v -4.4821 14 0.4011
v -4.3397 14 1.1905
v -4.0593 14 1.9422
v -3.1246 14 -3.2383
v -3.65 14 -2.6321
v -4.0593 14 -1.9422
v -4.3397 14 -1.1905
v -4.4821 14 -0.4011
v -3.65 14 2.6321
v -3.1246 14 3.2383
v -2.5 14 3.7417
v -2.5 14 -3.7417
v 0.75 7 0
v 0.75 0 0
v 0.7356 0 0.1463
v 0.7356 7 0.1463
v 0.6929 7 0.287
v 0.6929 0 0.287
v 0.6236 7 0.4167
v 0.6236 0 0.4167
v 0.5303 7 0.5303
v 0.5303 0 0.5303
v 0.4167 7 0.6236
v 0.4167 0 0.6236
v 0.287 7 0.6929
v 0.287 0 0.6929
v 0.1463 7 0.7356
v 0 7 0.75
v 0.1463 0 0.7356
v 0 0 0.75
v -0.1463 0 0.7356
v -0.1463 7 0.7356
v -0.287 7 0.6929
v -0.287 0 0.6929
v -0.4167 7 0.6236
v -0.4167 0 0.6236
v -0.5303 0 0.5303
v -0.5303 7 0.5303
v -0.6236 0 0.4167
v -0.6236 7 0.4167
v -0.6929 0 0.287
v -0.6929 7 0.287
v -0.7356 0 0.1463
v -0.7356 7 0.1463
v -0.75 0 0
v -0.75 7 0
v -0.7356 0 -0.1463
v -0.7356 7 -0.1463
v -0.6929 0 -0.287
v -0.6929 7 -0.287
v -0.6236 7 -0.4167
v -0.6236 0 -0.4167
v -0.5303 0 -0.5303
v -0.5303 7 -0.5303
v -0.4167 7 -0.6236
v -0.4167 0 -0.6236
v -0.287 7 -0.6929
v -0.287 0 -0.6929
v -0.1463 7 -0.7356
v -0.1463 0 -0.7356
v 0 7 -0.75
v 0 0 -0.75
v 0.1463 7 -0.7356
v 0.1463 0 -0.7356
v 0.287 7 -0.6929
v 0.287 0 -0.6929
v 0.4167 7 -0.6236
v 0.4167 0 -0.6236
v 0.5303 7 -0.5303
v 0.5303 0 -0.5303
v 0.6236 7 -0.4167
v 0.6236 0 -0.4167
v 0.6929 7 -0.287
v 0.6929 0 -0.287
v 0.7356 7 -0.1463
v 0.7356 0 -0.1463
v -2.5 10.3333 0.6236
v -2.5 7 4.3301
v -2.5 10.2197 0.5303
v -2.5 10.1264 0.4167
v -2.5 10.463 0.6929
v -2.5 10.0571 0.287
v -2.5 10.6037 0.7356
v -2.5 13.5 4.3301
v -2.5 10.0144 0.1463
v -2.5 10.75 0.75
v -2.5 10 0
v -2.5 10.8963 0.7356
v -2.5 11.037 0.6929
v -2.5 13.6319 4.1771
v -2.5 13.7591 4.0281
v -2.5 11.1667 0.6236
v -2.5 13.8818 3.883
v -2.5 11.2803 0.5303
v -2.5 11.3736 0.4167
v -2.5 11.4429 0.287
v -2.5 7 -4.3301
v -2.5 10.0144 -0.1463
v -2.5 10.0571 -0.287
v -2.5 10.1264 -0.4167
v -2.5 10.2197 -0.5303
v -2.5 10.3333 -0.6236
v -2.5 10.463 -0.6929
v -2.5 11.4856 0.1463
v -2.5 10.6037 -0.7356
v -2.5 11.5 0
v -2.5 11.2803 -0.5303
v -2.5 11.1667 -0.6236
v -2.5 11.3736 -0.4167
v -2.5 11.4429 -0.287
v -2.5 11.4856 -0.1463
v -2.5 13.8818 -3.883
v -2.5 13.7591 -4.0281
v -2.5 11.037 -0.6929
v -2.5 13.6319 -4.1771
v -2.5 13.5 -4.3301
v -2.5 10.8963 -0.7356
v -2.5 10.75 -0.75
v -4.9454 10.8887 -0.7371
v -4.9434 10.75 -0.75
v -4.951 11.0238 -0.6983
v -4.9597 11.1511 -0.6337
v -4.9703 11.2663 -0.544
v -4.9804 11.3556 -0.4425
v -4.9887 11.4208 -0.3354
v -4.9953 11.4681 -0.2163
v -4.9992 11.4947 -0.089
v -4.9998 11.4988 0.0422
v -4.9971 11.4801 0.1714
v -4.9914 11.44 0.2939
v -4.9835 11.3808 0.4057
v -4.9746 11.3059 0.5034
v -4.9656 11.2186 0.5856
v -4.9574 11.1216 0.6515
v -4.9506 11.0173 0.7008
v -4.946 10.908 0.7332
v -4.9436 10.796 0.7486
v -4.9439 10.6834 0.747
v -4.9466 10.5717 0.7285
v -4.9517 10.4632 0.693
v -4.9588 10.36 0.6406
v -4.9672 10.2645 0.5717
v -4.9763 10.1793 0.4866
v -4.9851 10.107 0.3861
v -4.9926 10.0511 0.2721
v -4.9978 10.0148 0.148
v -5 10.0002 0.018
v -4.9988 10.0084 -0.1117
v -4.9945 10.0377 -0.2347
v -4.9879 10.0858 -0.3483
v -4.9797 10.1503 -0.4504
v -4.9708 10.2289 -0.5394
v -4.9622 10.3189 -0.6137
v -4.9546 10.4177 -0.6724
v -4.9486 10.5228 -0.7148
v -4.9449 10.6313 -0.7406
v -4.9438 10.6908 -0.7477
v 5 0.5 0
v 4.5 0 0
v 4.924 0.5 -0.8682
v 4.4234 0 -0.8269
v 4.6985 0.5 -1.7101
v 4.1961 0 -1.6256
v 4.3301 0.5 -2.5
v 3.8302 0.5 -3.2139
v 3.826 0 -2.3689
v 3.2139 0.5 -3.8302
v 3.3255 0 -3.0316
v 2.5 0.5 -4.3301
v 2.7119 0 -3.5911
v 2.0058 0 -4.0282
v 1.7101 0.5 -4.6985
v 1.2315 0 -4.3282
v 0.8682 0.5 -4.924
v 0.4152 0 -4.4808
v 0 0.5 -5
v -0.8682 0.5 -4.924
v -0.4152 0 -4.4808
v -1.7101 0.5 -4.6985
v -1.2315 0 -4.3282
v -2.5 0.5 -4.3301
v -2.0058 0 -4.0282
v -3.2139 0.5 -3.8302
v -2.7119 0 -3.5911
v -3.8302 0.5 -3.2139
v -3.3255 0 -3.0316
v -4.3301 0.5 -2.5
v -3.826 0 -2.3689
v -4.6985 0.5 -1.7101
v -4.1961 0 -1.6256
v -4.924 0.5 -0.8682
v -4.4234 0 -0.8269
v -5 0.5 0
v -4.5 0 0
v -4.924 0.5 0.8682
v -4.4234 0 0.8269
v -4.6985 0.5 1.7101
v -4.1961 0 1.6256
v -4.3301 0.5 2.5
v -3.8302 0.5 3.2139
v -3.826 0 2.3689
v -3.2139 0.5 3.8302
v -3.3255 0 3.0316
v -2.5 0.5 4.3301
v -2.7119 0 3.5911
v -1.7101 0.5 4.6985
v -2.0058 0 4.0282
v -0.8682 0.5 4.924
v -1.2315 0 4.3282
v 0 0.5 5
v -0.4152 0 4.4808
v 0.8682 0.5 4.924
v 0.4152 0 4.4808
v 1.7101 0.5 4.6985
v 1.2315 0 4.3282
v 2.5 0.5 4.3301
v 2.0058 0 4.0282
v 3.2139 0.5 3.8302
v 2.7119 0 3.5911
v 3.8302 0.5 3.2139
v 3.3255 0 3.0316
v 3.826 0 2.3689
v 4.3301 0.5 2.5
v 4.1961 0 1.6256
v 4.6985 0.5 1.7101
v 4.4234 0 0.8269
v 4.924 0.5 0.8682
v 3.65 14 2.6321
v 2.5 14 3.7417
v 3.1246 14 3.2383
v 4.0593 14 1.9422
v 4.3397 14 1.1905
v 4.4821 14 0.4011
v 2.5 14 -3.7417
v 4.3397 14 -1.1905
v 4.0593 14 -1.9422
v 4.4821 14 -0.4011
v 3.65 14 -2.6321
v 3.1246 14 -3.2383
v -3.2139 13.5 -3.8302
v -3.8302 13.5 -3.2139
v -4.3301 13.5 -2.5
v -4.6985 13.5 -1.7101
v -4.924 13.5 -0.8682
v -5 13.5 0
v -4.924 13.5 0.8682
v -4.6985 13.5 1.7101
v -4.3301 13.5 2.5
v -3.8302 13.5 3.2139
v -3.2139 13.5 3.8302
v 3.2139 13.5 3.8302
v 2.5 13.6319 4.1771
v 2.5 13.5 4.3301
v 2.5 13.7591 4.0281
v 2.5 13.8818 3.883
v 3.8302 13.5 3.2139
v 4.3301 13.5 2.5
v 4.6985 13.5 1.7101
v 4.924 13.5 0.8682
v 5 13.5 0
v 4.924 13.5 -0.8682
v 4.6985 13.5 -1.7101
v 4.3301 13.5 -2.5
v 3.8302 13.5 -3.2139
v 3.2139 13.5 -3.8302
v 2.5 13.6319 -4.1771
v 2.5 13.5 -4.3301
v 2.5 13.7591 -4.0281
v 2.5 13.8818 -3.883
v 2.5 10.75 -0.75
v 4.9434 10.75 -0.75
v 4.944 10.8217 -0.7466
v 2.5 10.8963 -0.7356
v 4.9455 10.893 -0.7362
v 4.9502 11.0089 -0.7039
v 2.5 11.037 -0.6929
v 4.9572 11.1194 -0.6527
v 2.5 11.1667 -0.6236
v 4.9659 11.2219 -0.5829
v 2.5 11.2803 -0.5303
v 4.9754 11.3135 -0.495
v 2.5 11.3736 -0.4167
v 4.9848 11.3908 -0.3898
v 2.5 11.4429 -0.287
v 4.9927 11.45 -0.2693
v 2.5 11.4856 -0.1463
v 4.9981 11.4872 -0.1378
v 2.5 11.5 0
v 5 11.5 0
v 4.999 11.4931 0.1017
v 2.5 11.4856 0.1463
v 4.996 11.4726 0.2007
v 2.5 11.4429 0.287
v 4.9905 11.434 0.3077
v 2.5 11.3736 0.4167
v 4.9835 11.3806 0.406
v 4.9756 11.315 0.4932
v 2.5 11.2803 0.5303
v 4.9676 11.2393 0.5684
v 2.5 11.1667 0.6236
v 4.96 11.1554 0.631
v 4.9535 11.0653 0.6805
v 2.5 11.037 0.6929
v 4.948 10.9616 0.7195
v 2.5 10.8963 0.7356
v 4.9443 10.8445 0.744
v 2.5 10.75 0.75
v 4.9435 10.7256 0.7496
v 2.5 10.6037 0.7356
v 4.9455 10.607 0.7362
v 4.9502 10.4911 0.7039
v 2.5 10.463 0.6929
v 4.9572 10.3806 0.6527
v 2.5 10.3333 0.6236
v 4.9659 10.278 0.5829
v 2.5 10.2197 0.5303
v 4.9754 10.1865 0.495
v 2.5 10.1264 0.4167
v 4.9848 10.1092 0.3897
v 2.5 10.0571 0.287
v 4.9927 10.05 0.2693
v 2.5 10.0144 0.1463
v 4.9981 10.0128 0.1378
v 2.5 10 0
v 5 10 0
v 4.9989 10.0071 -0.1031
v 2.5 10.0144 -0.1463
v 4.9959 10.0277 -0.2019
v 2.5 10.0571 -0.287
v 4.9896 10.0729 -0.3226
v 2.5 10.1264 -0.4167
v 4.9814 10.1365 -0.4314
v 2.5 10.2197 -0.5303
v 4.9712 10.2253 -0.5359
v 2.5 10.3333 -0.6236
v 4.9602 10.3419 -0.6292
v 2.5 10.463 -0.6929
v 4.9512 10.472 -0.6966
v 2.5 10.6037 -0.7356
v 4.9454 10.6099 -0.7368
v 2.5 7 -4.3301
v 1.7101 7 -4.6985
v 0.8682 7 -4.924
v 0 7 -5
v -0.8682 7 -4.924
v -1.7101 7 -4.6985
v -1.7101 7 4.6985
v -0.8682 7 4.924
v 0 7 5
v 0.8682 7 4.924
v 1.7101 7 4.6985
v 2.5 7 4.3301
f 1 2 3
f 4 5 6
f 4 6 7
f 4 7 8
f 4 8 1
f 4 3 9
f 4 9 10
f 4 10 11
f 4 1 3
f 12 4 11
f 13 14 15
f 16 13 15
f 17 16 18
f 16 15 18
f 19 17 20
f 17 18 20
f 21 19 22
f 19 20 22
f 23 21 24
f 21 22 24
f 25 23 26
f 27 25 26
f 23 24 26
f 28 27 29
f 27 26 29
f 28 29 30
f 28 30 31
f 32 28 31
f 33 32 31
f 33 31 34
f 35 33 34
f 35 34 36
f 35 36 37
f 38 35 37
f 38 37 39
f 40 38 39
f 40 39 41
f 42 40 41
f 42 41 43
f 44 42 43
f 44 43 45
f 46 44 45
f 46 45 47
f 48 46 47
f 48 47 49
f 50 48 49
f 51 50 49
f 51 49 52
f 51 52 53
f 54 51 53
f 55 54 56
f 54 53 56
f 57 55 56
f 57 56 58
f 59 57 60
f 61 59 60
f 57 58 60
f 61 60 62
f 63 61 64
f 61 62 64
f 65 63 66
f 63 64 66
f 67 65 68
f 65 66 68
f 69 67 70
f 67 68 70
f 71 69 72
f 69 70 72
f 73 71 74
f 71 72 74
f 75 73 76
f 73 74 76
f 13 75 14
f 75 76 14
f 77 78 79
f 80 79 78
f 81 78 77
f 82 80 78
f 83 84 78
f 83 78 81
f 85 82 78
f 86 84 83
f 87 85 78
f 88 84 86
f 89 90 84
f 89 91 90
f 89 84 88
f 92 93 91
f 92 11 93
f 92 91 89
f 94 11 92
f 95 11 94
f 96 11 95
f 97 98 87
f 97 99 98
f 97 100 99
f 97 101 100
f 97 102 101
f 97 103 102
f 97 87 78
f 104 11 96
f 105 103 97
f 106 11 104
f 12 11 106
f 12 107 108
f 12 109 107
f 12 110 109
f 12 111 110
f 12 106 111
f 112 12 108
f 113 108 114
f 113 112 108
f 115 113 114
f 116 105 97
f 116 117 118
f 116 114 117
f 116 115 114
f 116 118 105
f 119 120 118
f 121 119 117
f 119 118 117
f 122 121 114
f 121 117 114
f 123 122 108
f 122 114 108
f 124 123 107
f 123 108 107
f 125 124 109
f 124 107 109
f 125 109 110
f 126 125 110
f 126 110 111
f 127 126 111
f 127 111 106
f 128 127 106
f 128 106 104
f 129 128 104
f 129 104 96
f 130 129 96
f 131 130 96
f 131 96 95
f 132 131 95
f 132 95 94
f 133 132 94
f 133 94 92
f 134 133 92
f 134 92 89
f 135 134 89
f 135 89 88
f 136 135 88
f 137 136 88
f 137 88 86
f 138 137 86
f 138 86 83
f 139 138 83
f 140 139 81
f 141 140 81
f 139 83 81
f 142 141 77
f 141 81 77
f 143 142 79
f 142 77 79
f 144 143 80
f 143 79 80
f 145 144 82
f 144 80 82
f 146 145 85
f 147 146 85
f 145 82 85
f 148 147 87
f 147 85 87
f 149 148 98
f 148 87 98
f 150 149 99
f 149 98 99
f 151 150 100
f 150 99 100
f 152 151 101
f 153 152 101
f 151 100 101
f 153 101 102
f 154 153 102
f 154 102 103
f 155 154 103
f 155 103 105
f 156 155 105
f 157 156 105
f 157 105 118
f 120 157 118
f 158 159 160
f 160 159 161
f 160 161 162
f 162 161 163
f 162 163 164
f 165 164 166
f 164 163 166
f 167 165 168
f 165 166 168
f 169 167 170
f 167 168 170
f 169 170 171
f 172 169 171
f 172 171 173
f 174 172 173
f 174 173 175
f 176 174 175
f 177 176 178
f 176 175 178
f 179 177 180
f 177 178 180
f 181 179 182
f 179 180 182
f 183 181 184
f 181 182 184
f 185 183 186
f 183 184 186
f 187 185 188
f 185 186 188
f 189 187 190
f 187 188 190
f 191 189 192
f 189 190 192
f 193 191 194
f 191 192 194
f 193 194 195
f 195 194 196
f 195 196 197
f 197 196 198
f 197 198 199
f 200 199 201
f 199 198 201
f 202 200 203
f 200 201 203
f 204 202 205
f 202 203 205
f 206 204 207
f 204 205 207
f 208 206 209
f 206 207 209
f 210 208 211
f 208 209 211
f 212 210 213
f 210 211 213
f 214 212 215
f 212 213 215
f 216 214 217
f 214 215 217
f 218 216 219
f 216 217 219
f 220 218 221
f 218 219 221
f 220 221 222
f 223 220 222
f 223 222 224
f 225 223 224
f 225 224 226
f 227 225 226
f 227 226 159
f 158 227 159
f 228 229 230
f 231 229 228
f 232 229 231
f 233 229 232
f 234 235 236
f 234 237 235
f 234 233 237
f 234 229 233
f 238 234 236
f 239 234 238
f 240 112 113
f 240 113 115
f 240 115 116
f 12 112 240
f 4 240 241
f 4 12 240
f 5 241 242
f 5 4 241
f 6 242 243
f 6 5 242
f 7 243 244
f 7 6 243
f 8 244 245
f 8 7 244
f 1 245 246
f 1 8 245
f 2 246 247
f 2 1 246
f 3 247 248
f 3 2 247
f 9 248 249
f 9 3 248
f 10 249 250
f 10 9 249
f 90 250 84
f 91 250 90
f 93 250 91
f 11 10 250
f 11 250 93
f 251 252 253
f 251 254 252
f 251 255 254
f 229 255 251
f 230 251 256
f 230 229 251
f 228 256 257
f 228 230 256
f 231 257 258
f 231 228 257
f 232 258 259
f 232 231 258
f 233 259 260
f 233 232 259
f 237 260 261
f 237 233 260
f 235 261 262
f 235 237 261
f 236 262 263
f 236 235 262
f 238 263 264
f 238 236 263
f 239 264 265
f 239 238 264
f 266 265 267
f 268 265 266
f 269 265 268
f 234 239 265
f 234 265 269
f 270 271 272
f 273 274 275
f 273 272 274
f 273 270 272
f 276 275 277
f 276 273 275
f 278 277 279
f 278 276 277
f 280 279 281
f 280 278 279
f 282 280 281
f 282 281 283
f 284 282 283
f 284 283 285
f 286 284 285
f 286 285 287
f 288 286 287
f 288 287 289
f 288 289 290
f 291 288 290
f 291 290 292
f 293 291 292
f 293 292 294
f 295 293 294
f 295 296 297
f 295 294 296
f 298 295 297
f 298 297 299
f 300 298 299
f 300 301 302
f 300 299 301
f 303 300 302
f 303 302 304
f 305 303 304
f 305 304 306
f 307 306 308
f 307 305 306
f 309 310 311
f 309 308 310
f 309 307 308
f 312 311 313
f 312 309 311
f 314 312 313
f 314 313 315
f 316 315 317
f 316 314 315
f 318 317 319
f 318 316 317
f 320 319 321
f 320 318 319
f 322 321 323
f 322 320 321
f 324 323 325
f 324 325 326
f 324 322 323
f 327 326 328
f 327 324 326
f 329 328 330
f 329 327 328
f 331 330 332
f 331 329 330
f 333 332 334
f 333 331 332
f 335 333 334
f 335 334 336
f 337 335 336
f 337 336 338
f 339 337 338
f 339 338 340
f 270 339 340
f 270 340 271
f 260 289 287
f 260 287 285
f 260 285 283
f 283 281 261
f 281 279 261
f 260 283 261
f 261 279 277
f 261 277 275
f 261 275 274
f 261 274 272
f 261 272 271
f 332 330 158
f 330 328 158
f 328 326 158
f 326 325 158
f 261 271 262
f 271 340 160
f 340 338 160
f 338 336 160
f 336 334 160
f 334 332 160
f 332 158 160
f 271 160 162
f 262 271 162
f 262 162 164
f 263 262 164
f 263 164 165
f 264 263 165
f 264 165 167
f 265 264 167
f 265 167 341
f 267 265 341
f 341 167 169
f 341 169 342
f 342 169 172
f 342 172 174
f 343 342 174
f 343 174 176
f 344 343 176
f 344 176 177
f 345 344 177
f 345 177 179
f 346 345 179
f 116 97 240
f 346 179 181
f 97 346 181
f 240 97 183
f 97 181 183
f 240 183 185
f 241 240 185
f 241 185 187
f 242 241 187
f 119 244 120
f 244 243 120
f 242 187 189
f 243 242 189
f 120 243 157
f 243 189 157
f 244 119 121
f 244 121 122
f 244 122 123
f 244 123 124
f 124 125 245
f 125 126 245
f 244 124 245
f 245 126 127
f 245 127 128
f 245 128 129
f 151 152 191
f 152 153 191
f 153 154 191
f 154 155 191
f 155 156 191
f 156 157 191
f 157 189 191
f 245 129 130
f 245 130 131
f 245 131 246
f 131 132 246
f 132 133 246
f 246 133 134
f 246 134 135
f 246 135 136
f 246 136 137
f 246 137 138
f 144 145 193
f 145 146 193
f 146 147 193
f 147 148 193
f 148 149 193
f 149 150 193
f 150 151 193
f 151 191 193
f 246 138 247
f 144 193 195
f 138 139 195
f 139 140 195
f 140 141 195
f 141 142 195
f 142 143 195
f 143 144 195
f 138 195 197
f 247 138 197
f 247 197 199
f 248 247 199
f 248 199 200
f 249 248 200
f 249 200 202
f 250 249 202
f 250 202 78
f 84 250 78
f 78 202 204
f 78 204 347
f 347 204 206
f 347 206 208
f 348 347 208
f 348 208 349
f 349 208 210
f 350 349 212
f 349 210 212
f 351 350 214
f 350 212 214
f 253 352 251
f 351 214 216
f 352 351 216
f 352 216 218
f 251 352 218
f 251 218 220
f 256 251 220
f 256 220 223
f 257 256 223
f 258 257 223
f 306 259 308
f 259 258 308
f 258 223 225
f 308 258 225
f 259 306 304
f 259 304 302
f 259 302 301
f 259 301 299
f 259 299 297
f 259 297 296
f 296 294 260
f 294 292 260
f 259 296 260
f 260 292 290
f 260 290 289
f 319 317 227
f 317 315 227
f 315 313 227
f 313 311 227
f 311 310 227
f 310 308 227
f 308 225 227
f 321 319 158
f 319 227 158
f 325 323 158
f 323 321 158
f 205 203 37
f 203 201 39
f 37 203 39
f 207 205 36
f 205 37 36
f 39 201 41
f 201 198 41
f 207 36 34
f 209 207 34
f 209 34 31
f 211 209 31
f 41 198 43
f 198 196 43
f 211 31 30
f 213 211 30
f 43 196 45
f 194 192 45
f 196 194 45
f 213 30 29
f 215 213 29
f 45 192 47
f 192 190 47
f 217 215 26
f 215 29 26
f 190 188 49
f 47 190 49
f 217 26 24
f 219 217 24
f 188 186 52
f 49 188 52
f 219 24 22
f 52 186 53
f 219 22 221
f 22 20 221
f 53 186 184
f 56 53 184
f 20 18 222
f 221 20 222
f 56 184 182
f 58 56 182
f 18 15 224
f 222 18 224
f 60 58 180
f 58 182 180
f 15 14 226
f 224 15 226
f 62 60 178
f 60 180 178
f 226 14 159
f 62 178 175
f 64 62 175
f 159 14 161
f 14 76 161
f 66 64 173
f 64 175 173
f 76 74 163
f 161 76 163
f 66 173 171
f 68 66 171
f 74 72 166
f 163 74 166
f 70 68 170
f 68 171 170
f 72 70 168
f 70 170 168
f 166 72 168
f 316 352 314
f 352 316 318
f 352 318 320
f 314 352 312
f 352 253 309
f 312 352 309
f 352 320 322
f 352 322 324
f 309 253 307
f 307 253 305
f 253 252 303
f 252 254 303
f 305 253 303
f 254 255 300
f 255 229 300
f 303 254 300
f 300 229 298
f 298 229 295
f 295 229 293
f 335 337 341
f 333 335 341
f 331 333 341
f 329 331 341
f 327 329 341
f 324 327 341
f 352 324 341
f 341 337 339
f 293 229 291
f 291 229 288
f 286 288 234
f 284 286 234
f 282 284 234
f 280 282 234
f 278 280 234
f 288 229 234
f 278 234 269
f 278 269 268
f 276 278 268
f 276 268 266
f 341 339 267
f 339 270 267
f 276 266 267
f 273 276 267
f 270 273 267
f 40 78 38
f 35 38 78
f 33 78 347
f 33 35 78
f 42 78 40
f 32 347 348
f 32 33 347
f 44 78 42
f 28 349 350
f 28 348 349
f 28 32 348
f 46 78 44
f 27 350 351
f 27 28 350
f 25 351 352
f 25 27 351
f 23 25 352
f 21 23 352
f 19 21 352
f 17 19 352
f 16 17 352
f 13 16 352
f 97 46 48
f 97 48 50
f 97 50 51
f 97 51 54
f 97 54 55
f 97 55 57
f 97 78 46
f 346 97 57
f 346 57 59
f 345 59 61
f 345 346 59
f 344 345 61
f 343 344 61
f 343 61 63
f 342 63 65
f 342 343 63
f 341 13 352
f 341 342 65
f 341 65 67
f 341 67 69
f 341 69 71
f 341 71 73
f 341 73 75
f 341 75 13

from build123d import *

# Parameters (mm, degrees)
SKETCH1_R                      = 5
BOSS_EXTRUDE1_DEPTH            = 14
CHAMFER1_SIZE                  = 0.5
CUT_EXTRUDE1_REACH             = 16
SKETCH2_R                      = 0.75
SKETCH3_W                      = 5
SKETCH3_H                      = 10
CUT_EXTRUDE2_DEPTH             = 7
CUT_EXTRUDE3_REACH             = 7
SKETCH4_R                      = 0.75
CUT_EXTRUDE3_DIRECTION_2_REACH = 7


with BuildPart() as part:
    # Sketch1 → Boss-Extrude1 (new body)
    with BuildSketch(Plane(origin=(0, 0, 0), x_dir=(1, 0, 0), z_dir=(0, 1, 0))):
        Circle(SKETCH1_R)
    extrude(amount=BOSS_EXTRUDE1_DEPTH)

    # Chamfer1
    chamfer1_edges = [part.edges().sort_by_distance(p)[0] for p in [
        (-5, 0, 0),
        (-5, 14, 0),
    ]]
    chamfer(chamfer1_edges, length=CHAMFER1_SIZE)

    # Sketch2 → Cut-Extrude1 (cut, up to next)
    with BuildSketch(Plane.XZ, mode=Mode.PRIVATE) as cut_extrude1_sk1:
        Circle(SKETCH2_R)
    cut_extrude1_tool1 = extrude(cut_extrude1_sk1.sketch, amount=-CUT_EXTRUDE1_REACH, mode=Mode.PRIVATE) & part.part
    add(cut_extrude1_tool1.solids().sort_by_distance((0, 0, 0))[0], mode=Mode.SUBTRACT)

    # Sketch3 → Cut-Extrude2 (cut)
    with BuildSketch(Plane(origin=(0, 14, 0), x_dir=(1, 0, 0), z_dir=(0, 1, 0))):
        Rectangle(SKETCH3_W, SKETCH3_H)
    extrude(amount=-CUT_EXTRUDE2_DEPTH, mode=Mode.SUBTRACT)

    # Sketch4 → Cut-Extrude3 (cut, up to next)
    with BuildSketch(Plane(origin=(0, 0, 0), x_dir=(0, 0, -1), z_dir=(1, 0, 0)), mode=Mode.PRIVATE) as cut_extrude3_sk1:
        with Locations((0, 10.75)):
            Circle(SKETCH4_R)
    cut_extrude3_tool1 = extrude(cut_extrude3_sk1.sketch, amount=-CUT_EXTRUDE3_REACH, mode=Mode.PRIVATE) & part.part
    add(cut_extrude3_tool1.solids().sort_by_distance((0, 10.75, 0))[0], mode=Mode.SUBTRACT)

    # Sketch4 → Cut-Extrude3 direction 2 (cut, up to next)
    with BuildSketch(Plane(origin=(0, 0, 0), x_dir=(0, 0, -1), z_dir=(1, 0, 0)), mode=Mode.PRIVATE) as cut_extrude3_direction_2_sk1:
        with Locations((0, 10.75)):
            Circle(SKETCH4_R)
    cut_extrude3_direction_2_tool1 = extrude(cut_extrude3_direction_2_sk1.sketch, amount=CUT_EXTRUDE3_DIRECTION_2_REACH, mode=Mode.PRIVATE) & part.part
    add(cut_extrude3_direction_2_tool1.solids().sort_by_distance((0, 10.75, 0))[0], mode=Mode.SUBTRACT)


solid = part.part
